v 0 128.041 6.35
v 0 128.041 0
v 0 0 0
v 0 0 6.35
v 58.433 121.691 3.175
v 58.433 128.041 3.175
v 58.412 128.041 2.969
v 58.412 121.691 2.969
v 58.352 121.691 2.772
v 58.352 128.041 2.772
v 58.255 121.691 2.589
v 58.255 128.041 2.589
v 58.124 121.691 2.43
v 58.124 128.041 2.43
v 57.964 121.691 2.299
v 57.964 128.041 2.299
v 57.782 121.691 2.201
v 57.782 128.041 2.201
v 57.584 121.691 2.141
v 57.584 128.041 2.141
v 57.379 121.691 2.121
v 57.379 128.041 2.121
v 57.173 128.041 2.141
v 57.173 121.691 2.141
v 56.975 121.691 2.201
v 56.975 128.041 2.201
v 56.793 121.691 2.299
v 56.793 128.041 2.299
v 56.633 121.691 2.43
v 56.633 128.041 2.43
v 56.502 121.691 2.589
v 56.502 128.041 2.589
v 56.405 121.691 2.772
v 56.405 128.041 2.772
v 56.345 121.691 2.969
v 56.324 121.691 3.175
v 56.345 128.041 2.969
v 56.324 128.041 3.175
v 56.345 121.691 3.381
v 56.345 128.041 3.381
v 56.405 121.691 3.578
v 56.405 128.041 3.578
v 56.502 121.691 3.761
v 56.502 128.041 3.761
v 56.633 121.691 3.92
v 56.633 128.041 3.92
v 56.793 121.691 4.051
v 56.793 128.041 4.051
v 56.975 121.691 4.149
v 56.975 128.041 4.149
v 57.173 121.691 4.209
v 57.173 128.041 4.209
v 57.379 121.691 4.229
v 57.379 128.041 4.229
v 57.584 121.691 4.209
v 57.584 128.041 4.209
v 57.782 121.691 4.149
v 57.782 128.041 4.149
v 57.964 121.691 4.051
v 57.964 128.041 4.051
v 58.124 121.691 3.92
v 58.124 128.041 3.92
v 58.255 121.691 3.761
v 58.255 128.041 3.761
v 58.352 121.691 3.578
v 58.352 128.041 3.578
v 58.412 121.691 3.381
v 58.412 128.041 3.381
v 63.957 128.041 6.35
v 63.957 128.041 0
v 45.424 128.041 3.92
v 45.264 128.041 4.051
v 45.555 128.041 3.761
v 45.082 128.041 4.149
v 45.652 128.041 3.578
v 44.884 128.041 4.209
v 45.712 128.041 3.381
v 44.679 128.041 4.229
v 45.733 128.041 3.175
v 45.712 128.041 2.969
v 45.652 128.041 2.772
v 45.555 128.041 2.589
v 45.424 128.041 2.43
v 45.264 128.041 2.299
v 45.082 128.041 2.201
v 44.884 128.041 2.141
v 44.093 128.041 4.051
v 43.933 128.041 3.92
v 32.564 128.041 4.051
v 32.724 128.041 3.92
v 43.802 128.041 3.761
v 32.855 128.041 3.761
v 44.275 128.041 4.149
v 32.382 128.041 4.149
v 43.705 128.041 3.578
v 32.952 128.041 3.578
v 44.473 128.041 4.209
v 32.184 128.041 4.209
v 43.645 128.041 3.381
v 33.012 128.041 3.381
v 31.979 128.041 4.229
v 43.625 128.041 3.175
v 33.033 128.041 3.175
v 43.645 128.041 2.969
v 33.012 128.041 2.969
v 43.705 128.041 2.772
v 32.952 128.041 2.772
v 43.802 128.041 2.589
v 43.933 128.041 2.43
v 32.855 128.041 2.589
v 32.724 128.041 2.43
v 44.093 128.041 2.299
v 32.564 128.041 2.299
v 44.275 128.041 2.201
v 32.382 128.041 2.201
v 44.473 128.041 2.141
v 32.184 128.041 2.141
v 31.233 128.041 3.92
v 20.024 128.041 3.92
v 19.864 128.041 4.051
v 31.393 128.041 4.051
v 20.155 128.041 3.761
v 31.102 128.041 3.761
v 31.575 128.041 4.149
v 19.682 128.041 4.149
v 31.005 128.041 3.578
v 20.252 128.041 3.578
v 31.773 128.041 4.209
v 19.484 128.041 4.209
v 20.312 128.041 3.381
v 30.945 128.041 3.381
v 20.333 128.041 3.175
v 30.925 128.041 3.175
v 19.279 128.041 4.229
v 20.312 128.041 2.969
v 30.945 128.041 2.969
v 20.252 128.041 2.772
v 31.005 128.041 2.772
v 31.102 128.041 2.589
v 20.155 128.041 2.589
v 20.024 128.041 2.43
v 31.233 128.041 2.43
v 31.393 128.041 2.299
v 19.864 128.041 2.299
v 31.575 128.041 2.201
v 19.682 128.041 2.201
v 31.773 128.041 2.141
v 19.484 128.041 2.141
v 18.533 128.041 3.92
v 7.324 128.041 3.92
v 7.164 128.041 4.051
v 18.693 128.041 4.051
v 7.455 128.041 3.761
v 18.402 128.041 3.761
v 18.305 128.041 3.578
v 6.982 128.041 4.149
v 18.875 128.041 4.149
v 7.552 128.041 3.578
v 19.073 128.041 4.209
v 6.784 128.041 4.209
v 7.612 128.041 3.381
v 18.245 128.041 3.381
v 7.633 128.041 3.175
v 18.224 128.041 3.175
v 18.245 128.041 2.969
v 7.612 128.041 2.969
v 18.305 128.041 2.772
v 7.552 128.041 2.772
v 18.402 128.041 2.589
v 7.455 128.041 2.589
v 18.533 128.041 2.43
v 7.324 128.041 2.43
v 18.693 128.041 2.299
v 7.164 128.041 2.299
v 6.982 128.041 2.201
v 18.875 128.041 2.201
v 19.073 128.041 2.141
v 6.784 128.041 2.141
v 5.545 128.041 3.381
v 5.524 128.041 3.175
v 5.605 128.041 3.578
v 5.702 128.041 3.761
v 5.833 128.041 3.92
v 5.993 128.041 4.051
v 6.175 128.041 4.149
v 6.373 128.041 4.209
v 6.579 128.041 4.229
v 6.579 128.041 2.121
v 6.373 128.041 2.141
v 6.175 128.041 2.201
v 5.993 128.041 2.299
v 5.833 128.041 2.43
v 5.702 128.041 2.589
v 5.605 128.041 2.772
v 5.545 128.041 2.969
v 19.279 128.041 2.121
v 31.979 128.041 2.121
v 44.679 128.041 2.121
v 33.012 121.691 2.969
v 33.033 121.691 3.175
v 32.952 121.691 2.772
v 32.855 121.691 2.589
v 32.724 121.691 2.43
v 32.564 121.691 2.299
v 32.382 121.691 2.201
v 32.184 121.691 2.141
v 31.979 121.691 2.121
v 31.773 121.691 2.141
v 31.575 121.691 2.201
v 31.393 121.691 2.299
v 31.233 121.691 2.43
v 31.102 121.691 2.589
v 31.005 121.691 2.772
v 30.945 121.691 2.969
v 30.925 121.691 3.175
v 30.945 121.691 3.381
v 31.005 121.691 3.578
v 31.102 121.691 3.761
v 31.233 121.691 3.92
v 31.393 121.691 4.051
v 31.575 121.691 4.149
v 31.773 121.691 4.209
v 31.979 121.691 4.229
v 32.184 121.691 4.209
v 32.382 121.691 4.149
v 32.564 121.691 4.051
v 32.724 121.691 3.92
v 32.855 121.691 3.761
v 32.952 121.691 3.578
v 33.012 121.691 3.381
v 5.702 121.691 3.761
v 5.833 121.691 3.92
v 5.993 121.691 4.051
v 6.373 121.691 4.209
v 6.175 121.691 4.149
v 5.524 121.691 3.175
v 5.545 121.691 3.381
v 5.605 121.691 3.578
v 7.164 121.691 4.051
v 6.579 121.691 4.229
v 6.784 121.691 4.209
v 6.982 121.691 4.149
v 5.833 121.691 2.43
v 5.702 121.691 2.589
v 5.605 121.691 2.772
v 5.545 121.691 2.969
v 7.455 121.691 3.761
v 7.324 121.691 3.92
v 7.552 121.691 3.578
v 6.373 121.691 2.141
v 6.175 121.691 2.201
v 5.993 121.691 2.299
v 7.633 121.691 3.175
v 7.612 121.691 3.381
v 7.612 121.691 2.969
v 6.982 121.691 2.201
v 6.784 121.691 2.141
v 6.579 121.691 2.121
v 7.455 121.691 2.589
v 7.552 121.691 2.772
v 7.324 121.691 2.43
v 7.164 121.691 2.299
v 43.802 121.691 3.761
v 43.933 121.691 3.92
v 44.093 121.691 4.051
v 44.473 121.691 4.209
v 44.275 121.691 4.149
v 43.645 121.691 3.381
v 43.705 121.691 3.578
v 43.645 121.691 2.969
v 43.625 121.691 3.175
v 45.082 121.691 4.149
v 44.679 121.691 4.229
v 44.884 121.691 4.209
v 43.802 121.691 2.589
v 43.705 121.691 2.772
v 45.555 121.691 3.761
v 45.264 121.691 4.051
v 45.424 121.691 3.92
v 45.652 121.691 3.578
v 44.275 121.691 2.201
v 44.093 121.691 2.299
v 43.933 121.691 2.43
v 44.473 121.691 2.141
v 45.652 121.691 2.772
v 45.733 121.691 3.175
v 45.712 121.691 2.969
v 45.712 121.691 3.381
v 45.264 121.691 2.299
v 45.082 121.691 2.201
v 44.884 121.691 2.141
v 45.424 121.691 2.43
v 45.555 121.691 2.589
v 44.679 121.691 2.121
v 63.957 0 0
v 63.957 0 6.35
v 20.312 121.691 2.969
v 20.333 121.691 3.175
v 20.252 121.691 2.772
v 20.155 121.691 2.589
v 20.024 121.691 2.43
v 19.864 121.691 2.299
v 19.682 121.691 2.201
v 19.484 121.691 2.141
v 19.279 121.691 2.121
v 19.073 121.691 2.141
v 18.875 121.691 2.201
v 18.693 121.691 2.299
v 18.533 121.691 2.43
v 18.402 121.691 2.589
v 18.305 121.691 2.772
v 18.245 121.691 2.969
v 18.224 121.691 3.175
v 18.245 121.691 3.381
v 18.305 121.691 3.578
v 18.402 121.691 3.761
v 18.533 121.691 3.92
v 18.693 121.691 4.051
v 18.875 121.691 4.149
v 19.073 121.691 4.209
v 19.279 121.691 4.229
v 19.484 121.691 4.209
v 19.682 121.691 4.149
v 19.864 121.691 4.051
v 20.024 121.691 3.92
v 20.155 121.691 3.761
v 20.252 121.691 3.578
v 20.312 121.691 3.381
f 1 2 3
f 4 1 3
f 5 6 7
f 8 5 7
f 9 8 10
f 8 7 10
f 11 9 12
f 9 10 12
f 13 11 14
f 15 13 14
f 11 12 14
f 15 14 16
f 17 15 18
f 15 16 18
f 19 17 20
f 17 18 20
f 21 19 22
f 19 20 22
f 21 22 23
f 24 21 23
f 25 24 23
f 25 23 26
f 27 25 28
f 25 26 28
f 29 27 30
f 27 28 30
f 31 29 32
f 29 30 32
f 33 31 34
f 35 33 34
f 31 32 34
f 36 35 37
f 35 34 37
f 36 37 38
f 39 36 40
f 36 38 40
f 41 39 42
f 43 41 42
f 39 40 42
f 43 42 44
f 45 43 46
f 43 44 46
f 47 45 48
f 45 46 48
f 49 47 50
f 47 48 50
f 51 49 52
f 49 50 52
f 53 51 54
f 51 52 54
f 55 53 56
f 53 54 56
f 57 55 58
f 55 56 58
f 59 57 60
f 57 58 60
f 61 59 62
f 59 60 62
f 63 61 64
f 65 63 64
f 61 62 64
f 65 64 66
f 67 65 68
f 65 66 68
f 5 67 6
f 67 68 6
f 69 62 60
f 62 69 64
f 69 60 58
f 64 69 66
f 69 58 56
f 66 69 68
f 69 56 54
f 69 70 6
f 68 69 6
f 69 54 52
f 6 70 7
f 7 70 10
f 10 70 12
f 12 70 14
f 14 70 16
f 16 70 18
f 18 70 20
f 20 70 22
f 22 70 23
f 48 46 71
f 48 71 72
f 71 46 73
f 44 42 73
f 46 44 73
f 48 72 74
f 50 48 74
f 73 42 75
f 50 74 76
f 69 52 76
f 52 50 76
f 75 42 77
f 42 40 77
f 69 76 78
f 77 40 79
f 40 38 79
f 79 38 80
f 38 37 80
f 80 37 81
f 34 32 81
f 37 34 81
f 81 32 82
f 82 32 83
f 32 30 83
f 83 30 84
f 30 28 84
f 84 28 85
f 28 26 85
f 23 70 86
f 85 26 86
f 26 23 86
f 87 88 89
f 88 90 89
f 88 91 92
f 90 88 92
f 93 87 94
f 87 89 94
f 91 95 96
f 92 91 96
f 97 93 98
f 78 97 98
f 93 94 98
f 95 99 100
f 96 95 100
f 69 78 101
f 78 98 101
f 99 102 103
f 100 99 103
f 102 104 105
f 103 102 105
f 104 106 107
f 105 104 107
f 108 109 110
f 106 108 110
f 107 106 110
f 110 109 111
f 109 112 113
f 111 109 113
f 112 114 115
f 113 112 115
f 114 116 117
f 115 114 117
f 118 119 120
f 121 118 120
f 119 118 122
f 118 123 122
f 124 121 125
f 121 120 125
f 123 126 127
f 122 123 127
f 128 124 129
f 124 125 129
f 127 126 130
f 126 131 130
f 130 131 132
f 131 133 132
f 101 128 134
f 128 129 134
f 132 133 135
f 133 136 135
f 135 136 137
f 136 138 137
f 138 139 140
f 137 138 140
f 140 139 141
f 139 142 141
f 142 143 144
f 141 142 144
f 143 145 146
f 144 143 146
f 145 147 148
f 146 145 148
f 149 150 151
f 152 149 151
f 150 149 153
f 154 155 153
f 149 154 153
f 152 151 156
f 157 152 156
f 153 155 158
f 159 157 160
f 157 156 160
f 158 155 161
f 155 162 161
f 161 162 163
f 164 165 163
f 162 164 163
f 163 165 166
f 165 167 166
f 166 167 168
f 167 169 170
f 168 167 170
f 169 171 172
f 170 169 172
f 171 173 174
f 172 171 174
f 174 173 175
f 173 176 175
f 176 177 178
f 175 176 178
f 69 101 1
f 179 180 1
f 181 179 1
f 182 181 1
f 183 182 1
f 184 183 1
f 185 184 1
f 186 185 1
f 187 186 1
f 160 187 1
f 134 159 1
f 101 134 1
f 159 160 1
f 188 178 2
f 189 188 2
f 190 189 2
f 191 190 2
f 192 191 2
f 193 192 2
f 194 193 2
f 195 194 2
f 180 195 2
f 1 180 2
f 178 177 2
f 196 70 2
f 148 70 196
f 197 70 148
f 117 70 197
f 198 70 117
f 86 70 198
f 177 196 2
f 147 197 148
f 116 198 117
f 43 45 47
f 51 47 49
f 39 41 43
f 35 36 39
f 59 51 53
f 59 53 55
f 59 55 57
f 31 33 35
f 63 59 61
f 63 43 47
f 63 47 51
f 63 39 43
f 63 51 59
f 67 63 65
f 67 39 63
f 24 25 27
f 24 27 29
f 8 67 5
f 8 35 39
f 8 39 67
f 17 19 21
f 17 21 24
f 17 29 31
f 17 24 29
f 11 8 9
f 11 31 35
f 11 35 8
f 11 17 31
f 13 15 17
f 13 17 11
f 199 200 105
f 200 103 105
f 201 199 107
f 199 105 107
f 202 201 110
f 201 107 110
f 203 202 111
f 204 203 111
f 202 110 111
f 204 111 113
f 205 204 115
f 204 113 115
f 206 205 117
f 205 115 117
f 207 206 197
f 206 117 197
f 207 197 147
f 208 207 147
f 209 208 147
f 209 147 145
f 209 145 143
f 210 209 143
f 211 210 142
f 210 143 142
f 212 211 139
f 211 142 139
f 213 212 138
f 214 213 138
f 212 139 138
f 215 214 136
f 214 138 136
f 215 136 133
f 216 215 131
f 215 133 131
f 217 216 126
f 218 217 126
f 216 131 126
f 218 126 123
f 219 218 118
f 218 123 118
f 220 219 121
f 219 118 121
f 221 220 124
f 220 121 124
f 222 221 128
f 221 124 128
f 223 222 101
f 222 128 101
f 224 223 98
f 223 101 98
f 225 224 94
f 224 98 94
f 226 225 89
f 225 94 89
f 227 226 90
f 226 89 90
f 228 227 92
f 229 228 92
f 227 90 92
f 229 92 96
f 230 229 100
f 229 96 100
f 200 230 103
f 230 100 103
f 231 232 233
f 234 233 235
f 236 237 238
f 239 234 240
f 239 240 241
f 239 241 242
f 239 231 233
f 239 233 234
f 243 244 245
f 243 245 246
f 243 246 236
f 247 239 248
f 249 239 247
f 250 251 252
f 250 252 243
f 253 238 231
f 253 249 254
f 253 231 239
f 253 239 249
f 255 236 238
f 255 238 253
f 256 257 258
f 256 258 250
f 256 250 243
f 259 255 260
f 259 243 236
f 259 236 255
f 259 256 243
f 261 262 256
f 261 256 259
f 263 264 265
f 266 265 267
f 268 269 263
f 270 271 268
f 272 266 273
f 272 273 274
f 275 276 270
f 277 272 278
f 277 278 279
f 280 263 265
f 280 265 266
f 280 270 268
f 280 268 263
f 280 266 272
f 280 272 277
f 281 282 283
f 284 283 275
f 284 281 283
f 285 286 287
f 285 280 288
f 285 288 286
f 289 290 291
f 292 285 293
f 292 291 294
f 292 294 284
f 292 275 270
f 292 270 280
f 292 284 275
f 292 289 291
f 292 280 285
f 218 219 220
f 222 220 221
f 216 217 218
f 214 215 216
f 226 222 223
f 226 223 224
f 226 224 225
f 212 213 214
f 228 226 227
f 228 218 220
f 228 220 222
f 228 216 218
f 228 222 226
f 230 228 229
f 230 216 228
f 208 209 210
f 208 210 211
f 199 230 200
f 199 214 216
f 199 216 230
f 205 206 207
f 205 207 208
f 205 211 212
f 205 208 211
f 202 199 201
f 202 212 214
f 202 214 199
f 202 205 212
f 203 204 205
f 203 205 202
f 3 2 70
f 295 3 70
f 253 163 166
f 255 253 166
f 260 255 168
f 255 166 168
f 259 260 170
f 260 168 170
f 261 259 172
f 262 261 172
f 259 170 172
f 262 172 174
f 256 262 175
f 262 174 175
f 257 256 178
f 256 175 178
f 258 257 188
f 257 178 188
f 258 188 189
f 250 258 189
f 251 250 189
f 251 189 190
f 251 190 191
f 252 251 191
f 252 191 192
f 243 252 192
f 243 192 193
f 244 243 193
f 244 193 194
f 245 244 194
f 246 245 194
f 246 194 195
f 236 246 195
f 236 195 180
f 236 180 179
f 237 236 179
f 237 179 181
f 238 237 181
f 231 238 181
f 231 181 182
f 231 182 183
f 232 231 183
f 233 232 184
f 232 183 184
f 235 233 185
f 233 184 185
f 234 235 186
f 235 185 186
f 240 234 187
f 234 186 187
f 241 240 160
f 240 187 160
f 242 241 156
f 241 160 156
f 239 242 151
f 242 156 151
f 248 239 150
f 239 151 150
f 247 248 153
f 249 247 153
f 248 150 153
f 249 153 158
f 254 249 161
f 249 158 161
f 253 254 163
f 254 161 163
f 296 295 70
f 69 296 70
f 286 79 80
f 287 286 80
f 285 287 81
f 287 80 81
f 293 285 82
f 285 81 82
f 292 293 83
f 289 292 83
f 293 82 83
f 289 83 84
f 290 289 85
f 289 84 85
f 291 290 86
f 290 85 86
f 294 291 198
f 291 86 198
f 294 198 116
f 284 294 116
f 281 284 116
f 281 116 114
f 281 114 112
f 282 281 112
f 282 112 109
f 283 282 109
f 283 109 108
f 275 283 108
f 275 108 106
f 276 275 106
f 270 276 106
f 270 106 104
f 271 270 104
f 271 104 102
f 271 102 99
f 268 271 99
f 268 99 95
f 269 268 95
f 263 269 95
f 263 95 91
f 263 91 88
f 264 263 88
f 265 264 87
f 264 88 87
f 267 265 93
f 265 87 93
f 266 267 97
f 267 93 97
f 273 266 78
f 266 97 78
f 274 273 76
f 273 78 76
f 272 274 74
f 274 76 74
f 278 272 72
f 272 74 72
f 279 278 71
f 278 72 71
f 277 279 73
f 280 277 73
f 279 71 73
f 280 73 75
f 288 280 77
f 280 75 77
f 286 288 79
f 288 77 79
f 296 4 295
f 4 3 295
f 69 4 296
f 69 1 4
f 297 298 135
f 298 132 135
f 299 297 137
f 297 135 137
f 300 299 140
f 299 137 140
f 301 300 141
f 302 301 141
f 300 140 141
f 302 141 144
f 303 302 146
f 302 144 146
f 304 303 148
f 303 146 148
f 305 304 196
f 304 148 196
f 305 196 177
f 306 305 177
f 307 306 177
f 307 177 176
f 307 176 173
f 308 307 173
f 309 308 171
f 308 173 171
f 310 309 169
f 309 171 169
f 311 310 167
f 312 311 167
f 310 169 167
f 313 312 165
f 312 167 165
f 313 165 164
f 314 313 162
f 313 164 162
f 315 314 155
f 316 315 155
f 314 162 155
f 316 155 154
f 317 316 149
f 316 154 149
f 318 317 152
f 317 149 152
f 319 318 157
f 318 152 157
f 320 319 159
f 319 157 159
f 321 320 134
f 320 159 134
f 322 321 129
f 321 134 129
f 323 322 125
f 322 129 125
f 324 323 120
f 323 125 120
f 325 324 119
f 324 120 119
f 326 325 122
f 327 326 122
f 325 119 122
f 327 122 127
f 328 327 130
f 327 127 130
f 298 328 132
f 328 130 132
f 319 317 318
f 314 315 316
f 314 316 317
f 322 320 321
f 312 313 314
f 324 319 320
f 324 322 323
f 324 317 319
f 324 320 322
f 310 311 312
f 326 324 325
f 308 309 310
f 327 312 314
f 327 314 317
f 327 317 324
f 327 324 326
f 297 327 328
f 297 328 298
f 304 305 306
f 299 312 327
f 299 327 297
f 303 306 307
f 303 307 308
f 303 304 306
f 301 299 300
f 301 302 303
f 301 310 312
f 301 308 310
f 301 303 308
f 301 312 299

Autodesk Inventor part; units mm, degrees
ref_plane "YZ Plane" through (0, 0, 0) normal (1, 0, 0) x (0, 1, 0)
ref_plane "XZ Plane" through (0, 0, 0) normal (0, 1, 0) x (-1, 0, 0)
ref_plane "XY Plane" through (0, 0, 0) normal (0, 0, 1) x (1, 0, 0)
sketch "Sketch1" plane through (0, 0, 0) normal (0, 0, 1) x (1, 0, 0)
  line L0 (0, 0) -> (63.9572, 0)
  line L1 (63.9572, 0) -> (63.9572, 128.0414)
  line L2 (63.9572, 128.0414) -> (0, 128.0414)
  line L3 (0, 128.0414) -> (0, 0)
  dimension "d0" = 63.9572
  dimension "d1" = 128.0414
extrude "Extrusion1" add sketch "Sketch1" along normal blind 6.35
sketch "Sketch2" plane through (0, 128.0414, 0) normal (0, 1, 0) x (1, 0, 0)
  line L0 (63.9572, 0) -> (0, 0) construction
  line L1 (0, 0) -> (0, -6.35) construction
  line L2 (63.9572, -6.35) -> (0, -6.35) construction
  line L3 (63.9572, 0) -> (63.9572, -6.35) construction
  line L4 (0, -6.35) -> (63.9572, -6.35) construction
  line L5 (31.9786, -6.35) -> (31.9786, 0) construction
  circle A0 centre (31.9786, -3.175) radius 1.0541
  dimension "d4" = 2.1082
extrude "Extrusion2" cut sketch "Sketch2" against normal blind 6.35
pattern_linear "Rectangular Pattern1" count 3 spacing 12.7 along (-1, 0, 0) count 3 spacing 12.7 along (1, 0, 0) of "Extrusion2"
properties part number "bottom"
